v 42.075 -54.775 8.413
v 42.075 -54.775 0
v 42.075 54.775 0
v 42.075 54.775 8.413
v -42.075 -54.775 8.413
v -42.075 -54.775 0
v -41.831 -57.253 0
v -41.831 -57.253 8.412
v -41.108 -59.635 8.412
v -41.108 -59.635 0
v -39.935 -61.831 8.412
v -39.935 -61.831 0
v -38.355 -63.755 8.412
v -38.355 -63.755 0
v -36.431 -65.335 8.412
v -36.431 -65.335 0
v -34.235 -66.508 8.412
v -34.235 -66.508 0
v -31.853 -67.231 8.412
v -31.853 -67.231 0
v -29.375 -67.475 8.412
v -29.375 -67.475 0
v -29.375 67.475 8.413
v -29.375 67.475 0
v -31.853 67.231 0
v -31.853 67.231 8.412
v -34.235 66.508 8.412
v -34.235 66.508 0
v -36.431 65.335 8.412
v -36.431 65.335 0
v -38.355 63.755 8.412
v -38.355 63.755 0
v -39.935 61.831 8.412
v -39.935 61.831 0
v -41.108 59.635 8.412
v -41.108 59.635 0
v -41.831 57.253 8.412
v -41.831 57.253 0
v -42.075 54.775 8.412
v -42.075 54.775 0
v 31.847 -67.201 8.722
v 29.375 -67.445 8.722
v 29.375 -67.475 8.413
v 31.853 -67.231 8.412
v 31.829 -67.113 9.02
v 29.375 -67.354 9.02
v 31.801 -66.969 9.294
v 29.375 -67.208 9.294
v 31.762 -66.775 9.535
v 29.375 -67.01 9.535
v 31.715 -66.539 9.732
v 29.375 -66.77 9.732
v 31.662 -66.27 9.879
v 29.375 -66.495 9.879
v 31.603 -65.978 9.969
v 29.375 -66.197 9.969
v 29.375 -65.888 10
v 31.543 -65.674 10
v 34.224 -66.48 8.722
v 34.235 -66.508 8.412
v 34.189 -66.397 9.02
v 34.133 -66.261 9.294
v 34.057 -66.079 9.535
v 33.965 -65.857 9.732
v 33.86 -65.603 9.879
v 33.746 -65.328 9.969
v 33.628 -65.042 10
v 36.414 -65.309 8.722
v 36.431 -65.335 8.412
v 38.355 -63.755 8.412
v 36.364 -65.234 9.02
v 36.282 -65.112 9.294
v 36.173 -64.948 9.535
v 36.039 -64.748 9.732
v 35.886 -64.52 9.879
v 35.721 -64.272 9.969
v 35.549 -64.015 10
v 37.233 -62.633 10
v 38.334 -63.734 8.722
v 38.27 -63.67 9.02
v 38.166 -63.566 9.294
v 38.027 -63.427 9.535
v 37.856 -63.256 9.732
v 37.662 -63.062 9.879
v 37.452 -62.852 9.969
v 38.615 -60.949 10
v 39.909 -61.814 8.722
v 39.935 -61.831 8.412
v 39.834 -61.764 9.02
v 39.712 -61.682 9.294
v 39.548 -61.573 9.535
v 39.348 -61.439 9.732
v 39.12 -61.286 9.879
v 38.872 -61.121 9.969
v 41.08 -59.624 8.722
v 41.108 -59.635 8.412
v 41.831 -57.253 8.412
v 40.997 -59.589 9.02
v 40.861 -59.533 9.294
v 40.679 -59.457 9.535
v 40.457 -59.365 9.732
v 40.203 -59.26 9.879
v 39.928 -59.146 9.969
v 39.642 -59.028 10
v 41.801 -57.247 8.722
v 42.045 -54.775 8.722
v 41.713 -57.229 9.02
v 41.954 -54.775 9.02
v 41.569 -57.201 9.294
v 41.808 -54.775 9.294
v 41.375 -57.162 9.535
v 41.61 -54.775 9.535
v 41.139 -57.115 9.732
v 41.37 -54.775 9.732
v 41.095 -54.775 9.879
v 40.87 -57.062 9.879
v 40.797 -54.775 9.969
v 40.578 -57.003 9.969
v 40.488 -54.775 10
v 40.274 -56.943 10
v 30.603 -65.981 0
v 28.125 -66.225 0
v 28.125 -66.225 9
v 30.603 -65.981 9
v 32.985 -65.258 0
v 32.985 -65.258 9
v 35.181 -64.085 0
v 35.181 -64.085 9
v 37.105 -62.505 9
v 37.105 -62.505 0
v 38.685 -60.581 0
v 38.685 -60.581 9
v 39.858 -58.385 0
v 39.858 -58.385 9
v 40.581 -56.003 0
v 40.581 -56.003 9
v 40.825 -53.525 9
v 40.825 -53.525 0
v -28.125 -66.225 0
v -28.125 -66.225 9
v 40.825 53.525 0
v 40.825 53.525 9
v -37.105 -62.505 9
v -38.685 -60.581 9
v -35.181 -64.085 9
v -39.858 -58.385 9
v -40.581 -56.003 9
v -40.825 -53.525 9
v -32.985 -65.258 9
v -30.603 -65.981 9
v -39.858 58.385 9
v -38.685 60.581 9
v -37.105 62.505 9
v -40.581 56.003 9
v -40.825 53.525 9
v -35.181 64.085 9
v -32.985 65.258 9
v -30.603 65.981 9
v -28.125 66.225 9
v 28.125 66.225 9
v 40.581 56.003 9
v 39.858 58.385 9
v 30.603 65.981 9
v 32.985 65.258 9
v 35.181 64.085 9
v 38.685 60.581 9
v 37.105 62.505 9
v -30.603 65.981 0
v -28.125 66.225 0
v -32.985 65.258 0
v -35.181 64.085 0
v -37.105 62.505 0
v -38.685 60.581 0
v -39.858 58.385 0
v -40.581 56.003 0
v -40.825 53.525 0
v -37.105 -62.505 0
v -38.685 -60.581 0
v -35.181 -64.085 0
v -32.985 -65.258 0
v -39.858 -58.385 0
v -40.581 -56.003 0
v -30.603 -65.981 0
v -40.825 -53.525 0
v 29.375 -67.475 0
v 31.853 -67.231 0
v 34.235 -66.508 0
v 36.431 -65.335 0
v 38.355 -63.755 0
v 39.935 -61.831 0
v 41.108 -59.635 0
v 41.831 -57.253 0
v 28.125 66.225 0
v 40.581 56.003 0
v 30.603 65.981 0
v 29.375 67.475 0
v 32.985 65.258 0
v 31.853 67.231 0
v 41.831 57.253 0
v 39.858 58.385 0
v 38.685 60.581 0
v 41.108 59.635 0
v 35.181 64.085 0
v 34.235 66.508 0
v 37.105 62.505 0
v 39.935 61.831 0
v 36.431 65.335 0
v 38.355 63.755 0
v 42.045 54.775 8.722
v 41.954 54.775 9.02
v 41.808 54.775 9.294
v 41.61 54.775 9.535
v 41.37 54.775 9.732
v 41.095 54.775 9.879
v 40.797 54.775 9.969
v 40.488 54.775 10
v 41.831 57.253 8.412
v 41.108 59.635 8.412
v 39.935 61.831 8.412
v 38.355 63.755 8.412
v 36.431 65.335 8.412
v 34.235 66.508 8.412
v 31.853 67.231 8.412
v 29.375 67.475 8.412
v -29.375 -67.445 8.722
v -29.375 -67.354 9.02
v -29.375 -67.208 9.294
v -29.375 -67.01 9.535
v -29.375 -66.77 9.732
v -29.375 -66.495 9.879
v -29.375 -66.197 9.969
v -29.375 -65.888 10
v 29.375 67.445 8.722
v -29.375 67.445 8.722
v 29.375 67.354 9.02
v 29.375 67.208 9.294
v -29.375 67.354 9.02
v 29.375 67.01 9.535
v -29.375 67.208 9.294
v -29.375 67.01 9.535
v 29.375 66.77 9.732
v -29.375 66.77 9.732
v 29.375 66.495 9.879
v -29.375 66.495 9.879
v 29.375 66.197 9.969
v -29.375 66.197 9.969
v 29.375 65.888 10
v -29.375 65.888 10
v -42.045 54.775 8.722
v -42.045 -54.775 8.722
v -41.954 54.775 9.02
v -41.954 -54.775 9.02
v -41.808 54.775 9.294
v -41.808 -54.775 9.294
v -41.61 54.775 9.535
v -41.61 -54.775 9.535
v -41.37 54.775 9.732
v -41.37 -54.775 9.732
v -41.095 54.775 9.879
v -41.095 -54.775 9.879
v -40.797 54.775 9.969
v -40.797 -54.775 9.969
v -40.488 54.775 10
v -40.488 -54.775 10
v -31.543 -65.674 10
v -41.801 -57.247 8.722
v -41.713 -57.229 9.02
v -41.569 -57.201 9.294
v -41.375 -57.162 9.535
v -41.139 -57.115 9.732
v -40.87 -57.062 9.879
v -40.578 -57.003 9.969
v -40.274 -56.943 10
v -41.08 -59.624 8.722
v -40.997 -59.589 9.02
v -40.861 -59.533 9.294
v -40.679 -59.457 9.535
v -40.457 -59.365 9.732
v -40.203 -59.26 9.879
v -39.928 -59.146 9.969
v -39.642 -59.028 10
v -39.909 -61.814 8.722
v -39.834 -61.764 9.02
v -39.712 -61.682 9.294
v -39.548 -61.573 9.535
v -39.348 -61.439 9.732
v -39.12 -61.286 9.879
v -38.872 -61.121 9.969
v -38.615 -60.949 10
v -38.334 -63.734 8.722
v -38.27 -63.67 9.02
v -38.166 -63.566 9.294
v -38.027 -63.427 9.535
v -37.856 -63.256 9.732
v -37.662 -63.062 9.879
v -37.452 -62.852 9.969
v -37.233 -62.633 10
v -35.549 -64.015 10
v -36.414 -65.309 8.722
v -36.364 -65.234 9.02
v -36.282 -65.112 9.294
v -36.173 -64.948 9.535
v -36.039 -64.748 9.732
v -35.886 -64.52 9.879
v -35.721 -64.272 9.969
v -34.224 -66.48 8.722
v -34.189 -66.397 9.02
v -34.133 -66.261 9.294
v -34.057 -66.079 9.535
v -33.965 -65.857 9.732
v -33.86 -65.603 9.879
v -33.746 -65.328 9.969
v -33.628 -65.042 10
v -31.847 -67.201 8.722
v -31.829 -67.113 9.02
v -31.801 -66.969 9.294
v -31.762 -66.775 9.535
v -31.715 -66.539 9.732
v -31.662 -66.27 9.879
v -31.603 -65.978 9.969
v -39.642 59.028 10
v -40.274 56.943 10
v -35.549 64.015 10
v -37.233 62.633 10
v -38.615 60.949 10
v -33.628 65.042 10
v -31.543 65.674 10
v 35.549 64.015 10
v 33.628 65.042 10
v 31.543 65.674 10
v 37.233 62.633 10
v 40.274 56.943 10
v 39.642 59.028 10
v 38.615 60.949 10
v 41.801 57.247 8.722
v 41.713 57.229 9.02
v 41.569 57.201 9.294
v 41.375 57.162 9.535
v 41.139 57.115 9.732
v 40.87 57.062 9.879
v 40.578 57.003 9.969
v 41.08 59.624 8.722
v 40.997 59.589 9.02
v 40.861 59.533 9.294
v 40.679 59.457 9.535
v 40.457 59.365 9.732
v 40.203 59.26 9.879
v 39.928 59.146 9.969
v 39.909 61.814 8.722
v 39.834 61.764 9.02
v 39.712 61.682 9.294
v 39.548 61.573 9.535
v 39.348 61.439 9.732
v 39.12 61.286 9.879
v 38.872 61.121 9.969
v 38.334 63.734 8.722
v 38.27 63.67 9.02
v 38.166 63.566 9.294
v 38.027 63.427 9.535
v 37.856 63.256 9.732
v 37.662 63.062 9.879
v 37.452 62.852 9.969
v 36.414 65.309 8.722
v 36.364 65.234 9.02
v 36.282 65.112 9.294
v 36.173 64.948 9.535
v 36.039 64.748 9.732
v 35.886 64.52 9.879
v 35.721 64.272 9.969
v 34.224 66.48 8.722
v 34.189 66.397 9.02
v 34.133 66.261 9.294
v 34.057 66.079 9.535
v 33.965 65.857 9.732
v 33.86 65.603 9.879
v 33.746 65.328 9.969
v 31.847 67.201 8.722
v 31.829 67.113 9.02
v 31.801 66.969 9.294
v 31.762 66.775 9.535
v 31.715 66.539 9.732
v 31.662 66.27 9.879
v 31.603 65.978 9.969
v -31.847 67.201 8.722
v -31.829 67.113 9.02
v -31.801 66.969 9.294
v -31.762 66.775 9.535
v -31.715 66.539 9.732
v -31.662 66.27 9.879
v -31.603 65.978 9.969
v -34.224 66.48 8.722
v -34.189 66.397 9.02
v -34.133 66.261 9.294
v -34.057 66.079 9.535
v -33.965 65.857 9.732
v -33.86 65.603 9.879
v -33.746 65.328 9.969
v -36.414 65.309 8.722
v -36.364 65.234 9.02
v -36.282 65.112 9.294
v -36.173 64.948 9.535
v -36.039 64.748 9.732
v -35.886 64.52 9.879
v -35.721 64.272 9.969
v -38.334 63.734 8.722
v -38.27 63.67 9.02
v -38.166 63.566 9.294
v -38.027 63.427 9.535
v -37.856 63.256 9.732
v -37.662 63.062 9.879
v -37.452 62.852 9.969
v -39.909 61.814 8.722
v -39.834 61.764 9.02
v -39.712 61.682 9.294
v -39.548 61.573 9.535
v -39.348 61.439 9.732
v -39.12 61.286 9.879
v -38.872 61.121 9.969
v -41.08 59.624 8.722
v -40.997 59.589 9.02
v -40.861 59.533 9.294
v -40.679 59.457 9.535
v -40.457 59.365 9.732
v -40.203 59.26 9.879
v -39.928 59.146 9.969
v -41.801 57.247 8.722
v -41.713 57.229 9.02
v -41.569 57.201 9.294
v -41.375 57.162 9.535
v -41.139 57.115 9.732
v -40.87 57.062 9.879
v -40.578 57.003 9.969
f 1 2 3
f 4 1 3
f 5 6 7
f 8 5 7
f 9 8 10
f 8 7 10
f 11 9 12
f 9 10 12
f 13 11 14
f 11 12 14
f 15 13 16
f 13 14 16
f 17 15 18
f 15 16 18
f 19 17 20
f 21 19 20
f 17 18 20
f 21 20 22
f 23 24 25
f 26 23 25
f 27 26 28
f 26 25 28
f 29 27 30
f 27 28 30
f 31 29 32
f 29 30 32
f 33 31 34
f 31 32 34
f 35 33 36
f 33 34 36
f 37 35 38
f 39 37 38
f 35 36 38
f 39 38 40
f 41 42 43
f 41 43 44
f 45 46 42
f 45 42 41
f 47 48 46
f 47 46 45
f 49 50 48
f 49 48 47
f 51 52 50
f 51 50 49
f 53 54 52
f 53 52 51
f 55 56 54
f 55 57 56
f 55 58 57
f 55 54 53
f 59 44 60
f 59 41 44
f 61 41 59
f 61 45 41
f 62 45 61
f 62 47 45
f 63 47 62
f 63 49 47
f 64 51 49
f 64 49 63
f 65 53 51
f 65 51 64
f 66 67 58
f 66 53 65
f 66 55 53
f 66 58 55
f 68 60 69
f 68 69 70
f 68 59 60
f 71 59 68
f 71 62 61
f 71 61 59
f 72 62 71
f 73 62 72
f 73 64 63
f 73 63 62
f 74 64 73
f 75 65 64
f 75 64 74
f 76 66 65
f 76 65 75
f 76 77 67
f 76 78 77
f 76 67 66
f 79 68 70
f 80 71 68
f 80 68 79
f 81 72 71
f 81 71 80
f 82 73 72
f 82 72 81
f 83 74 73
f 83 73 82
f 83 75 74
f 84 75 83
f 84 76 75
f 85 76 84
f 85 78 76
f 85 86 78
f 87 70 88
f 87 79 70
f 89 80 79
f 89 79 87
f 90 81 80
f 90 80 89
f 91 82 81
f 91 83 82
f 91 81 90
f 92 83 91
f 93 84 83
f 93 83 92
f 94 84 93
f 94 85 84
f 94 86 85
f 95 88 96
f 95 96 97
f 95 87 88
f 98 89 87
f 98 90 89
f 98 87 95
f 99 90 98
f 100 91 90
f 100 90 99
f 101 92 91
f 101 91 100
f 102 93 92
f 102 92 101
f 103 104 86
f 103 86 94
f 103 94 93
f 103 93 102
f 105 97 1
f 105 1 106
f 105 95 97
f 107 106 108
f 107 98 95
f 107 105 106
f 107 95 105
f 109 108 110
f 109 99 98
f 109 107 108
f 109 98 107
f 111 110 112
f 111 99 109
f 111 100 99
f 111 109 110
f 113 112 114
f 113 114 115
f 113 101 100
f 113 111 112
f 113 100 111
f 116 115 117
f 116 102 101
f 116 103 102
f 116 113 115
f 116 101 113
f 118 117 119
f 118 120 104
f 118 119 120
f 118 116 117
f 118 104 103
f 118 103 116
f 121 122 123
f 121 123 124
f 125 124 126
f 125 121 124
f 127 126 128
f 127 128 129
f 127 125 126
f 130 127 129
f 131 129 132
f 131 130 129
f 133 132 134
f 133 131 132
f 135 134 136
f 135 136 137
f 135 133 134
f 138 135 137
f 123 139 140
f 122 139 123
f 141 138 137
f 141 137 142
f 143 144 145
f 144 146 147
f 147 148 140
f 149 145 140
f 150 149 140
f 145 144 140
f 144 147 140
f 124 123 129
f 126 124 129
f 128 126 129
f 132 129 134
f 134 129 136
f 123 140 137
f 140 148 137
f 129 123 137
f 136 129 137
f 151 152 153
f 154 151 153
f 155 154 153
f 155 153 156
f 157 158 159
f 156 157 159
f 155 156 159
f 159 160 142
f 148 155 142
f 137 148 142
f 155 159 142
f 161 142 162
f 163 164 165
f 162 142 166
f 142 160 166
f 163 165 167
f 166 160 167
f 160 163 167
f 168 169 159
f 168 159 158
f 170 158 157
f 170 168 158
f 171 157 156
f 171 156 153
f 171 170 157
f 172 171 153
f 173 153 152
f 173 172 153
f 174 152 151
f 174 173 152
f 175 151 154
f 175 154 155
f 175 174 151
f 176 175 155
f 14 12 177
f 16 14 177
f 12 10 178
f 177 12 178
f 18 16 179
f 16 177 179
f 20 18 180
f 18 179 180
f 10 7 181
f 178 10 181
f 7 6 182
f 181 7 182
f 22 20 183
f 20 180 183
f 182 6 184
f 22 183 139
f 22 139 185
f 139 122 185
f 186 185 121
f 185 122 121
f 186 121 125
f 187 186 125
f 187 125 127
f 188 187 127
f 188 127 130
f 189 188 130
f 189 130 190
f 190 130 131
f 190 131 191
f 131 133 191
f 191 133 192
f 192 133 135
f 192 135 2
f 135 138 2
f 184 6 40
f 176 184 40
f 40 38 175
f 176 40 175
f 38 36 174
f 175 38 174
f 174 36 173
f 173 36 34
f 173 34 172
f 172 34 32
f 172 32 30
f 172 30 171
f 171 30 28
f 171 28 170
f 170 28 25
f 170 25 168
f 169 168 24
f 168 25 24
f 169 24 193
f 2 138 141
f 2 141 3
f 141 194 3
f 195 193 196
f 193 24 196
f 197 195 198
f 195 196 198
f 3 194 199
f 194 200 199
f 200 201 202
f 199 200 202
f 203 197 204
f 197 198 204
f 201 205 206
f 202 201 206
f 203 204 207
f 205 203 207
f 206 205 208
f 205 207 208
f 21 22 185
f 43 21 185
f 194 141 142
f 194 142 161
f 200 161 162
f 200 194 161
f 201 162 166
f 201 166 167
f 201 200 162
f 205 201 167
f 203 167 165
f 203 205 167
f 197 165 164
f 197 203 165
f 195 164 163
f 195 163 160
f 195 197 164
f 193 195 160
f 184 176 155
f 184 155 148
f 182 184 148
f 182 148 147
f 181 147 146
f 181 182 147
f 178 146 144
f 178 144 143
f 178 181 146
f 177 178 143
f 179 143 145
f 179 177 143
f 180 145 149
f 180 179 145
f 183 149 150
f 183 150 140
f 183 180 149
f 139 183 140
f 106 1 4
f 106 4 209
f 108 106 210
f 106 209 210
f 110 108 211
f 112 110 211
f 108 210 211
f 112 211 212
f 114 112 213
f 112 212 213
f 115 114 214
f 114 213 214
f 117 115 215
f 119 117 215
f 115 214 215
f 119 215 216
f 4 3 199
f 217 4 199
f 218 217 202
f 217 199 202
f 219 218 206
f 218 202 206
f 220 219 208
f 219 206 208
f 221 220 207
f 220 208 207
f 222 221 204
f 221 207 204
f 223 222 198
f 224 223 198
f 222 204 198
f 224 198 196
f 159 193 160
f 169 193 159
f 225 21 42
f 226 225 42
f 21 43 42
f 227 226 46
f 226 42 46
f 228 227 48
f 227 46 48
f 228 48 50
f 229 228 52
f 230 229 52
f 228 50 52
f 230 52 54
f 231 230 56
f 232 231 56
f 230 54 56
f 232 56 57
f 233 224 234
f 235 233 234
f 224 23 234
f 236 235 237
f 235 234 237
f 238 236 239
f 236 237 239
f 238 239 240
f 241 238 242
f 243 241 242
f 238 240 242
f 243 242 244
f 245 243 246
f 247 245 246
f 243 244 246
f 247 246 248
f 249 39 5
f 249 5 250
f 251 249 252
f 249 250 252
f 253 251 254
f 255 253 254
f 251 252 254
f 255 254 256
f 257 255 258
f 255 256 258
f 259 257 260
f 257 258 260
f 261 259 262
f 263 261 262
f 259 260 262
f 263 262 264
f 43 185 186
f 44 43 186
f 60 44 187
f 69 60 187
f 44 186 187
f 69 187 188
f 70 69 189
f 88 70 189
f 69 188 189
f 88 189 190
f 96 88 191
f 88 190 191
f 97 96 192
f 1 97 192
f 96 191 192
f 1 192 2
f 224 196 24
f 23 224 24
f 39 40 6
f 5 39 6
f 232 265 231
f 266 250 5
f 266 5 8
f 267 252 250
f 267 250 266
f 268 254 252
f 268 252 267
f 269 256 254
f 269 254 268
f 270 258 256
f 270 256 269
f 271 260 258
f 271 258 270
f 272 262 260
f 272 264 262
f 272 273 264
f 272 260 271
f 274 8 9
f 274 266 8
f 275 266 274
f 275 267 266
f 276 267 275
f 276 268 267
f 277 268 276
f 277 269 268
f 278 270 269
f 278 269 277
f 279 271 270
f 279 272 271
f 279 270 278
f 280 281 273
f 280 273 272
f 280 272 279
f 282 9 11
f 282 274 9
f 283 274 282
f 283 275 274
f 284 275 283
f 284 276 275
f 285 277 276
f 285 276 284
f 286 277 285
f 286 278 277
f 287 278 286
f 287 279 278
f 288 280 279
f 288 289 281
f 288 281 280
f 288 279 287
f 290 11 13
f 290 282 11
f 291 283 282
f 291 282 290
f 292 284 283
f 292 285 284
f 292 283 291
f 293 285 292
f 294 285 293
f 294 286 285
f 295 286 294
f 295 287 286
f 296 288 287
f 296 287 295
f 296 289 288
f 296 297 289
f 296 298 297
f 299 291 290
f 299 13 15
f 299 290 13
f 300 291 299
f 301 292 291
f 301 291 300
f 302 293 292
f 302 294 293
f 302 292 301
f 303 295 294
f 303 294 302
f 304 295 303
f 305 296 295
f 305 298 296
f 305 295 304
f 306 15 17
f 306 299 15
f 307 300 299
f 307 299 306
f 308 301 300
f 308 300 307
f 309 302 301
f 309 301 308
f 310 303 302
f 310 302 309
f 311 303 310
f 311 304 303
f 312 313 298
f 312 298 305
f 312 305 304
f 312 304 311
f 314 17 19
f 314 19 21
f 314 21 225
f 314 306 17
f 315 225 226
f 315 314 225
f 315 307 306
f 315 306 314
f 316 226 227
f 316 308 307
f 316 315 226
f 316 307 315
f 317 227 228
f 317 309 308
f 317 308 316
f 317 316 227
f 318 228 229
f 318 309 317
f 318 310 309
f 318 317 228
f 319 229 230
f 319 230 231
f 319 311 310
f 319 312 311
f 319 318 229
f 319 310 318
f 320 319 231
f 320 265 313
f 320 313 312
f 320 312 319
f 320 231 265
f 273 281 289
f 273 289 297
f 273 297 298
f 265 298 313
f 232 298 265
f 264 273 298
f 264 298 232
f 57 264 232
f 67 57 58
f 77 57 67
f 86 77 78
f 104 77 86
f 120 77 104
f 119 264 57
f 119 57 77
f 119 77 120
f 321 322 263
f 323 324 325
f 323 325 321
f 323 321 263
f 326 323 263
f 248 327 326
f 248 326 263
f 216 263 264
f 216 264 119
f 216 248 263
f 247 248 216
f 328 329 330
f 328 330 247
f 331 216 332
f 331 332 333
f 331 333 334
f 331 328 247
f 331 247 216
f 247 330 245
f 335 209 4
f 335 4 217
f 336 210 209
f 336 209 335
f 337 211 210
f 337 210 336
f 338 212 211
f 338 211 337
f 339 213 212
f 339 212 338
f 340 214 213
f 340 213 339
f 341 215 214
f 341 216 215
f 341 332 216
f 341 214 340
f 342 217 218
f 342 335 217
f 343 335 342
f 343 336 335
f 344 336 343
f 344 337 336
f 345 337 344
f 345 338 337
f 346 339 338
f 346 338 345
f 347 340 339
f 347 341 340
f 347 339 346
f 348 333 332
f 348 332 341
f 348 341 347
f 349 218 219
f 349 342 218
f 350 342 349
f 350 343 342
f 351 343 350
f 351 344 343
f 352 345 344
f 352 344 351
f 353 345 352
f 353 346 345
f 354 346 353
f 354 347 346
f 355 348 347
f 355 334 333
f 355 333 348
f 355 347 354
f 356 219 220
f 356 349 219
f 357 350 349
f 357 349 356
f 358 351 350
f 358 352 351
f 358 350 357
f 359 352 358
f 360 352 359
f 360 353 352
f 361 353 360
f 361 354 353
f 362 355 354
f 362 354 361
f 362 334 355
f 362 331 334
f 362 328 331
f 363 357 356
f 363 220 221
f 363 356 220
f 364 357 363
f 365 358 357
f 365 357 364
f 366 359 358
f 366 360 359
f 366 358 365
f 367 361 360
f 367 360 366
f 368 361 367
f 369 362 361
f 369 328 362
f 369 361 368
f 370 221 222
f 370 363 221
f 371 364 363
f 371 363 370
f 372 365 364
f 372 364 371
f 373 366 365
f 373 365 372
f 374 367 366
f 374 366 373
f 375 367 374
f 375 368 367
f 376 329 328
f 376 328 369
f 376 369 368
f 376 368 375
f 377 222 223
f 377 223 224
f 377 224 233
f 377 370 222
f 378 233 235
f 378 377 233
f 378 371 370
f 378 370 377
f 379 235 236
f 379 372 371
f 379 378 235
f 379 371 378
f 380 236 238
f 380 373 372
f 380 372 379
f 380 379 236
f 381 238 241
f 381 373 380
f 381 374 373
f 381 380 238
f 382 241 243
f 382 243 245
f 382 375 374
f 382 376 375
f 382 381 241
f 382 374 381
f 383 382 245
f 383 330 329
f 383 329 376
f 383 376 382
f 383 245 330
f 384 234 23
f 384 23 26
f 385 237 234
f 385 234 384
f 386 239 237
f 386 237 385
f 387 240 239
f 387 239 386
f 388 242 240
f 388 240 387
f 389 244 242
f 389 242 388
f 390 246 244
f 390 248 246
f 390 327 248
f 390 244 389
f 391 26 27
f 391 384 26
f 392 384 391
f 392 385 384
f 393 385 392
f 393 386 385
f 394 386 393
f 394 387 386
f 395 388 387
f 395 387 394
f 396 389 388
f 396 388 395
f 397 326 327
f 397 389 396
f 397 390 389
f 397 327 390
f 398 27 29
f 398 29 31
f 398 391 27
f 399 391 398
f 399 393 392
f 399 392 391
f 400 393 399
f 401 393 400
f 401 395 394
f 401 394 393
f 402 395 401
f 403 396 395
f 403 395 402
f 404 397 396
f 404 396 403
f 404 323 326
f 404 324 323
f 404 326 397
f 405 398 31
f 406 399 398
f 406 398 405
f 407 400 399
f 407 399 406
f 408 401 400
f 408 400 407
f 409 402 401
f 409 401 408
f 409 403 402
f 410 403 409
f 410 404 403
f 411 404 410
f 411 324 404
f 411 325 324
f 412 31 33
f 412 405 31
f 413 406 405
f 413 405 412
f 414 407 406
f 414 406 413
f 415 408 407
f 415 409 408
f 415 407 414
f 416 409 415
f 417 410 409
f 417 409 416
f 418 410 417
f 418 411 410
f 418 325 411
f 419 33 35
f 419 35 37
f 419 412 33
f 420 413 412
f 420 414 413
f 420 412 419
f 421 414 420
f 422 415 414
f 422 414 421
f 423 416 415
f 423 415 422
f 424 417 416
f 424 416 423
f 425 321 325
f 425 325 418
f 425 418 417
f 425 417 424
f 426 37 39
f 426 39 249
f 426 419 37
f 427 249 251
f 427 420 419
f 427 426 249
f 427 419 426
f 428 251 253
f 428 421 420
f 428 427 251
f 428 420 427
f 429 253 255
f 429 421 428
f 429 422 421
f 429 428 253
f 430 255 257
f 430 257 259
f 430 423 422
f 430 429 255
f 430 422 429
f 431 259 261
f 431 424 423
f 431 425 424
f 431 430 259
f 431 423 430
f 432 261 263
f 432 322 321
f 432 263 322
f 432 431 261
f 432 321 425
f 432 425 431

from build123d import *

# Parameters (mm, degrees)
F1_DEPTH = 10
F2_R     = 1.5875
F4_DEPTH = 9


with BuildPart() as f1:
    # F0 (on Top) → F1 (new body)
    with BuildSketch(Plane.XY):
        with BuildLine():
            ThreePointArc((42.0751, 54.7751), (38.355356, 63.755356), (29.3751, 67.4751))
            Line((29.3751, 67.4751), (-29.3751, 67.4751))
            ThreePointArc((-29.3751, 67.4751), (-38.355356, 63.755356), (-42.0751, 54.7751))
            Line((-42.0751, 54.7751), (-42.0751, -54.7751))
            ThreePointArc((-42.0751, -54.7751), (-38.355356, -63.755356), (-29.3751, -67.4751))
            Line((-29.3751, -67.4751), (29.3751, -67.4751))
            ThreePointArc((29.3751, -67.4751), (38.355356, -63.755356), (42.0751, -54.7751))
            Line((42.0751, -54.7751), (42.0751, 54.7751))
        make_face()
    extrude(amount=F1_DEPTH)

    # F2
    f2_edges = [f1.edges().sort_by_distance(p)[0] for p in [
        (42.0751, 0, 10),
        (38.355356, -63.755356, 10),
        (0, -67.4751, 10),
        (-38.355356, -63.755356, 10),
        (-42.0751, 0, 10),
        (-38.355356, 63.755356, 10),
        (0, 67.4751, 10),
        (38.355356, 63.755356, 10),
    ]]
    fillet(f2_edges, radius=F2_R)

    # F3 (on Top) → F4 (cut)
    with BuildSketch(Plane.XY):
        with BuildLine():
            Line((-28.125, -66.225), (28.125, -66.225))
            ThreePointArc((28.125, -66.225), (37.105256, -62.505256), (40.825, -53.525))
            Line((40.825, -53.525), (40.825, 53.525))
            ThreePointArc((40.825, 53.525), (37.105256, 62.505256), (28.125, 66.225))
            Line((28.125, 66.225), (-28.125, 66.225))
            ThreePointArc((-28.125, 66.225), (-37.105256, 62.505256), (-40.825, 53.525))
            Line((-40.825, 53.525), (-40.825, -53.525))
            ThreePointArc((-40.825, -53.525), (-37.105256, -62.505256), (-28.125, -66.225))
        make_face()
    extrude(amount=F4_DEPTH, mode=Mode.SUBTRACT)


solid = f1.part
